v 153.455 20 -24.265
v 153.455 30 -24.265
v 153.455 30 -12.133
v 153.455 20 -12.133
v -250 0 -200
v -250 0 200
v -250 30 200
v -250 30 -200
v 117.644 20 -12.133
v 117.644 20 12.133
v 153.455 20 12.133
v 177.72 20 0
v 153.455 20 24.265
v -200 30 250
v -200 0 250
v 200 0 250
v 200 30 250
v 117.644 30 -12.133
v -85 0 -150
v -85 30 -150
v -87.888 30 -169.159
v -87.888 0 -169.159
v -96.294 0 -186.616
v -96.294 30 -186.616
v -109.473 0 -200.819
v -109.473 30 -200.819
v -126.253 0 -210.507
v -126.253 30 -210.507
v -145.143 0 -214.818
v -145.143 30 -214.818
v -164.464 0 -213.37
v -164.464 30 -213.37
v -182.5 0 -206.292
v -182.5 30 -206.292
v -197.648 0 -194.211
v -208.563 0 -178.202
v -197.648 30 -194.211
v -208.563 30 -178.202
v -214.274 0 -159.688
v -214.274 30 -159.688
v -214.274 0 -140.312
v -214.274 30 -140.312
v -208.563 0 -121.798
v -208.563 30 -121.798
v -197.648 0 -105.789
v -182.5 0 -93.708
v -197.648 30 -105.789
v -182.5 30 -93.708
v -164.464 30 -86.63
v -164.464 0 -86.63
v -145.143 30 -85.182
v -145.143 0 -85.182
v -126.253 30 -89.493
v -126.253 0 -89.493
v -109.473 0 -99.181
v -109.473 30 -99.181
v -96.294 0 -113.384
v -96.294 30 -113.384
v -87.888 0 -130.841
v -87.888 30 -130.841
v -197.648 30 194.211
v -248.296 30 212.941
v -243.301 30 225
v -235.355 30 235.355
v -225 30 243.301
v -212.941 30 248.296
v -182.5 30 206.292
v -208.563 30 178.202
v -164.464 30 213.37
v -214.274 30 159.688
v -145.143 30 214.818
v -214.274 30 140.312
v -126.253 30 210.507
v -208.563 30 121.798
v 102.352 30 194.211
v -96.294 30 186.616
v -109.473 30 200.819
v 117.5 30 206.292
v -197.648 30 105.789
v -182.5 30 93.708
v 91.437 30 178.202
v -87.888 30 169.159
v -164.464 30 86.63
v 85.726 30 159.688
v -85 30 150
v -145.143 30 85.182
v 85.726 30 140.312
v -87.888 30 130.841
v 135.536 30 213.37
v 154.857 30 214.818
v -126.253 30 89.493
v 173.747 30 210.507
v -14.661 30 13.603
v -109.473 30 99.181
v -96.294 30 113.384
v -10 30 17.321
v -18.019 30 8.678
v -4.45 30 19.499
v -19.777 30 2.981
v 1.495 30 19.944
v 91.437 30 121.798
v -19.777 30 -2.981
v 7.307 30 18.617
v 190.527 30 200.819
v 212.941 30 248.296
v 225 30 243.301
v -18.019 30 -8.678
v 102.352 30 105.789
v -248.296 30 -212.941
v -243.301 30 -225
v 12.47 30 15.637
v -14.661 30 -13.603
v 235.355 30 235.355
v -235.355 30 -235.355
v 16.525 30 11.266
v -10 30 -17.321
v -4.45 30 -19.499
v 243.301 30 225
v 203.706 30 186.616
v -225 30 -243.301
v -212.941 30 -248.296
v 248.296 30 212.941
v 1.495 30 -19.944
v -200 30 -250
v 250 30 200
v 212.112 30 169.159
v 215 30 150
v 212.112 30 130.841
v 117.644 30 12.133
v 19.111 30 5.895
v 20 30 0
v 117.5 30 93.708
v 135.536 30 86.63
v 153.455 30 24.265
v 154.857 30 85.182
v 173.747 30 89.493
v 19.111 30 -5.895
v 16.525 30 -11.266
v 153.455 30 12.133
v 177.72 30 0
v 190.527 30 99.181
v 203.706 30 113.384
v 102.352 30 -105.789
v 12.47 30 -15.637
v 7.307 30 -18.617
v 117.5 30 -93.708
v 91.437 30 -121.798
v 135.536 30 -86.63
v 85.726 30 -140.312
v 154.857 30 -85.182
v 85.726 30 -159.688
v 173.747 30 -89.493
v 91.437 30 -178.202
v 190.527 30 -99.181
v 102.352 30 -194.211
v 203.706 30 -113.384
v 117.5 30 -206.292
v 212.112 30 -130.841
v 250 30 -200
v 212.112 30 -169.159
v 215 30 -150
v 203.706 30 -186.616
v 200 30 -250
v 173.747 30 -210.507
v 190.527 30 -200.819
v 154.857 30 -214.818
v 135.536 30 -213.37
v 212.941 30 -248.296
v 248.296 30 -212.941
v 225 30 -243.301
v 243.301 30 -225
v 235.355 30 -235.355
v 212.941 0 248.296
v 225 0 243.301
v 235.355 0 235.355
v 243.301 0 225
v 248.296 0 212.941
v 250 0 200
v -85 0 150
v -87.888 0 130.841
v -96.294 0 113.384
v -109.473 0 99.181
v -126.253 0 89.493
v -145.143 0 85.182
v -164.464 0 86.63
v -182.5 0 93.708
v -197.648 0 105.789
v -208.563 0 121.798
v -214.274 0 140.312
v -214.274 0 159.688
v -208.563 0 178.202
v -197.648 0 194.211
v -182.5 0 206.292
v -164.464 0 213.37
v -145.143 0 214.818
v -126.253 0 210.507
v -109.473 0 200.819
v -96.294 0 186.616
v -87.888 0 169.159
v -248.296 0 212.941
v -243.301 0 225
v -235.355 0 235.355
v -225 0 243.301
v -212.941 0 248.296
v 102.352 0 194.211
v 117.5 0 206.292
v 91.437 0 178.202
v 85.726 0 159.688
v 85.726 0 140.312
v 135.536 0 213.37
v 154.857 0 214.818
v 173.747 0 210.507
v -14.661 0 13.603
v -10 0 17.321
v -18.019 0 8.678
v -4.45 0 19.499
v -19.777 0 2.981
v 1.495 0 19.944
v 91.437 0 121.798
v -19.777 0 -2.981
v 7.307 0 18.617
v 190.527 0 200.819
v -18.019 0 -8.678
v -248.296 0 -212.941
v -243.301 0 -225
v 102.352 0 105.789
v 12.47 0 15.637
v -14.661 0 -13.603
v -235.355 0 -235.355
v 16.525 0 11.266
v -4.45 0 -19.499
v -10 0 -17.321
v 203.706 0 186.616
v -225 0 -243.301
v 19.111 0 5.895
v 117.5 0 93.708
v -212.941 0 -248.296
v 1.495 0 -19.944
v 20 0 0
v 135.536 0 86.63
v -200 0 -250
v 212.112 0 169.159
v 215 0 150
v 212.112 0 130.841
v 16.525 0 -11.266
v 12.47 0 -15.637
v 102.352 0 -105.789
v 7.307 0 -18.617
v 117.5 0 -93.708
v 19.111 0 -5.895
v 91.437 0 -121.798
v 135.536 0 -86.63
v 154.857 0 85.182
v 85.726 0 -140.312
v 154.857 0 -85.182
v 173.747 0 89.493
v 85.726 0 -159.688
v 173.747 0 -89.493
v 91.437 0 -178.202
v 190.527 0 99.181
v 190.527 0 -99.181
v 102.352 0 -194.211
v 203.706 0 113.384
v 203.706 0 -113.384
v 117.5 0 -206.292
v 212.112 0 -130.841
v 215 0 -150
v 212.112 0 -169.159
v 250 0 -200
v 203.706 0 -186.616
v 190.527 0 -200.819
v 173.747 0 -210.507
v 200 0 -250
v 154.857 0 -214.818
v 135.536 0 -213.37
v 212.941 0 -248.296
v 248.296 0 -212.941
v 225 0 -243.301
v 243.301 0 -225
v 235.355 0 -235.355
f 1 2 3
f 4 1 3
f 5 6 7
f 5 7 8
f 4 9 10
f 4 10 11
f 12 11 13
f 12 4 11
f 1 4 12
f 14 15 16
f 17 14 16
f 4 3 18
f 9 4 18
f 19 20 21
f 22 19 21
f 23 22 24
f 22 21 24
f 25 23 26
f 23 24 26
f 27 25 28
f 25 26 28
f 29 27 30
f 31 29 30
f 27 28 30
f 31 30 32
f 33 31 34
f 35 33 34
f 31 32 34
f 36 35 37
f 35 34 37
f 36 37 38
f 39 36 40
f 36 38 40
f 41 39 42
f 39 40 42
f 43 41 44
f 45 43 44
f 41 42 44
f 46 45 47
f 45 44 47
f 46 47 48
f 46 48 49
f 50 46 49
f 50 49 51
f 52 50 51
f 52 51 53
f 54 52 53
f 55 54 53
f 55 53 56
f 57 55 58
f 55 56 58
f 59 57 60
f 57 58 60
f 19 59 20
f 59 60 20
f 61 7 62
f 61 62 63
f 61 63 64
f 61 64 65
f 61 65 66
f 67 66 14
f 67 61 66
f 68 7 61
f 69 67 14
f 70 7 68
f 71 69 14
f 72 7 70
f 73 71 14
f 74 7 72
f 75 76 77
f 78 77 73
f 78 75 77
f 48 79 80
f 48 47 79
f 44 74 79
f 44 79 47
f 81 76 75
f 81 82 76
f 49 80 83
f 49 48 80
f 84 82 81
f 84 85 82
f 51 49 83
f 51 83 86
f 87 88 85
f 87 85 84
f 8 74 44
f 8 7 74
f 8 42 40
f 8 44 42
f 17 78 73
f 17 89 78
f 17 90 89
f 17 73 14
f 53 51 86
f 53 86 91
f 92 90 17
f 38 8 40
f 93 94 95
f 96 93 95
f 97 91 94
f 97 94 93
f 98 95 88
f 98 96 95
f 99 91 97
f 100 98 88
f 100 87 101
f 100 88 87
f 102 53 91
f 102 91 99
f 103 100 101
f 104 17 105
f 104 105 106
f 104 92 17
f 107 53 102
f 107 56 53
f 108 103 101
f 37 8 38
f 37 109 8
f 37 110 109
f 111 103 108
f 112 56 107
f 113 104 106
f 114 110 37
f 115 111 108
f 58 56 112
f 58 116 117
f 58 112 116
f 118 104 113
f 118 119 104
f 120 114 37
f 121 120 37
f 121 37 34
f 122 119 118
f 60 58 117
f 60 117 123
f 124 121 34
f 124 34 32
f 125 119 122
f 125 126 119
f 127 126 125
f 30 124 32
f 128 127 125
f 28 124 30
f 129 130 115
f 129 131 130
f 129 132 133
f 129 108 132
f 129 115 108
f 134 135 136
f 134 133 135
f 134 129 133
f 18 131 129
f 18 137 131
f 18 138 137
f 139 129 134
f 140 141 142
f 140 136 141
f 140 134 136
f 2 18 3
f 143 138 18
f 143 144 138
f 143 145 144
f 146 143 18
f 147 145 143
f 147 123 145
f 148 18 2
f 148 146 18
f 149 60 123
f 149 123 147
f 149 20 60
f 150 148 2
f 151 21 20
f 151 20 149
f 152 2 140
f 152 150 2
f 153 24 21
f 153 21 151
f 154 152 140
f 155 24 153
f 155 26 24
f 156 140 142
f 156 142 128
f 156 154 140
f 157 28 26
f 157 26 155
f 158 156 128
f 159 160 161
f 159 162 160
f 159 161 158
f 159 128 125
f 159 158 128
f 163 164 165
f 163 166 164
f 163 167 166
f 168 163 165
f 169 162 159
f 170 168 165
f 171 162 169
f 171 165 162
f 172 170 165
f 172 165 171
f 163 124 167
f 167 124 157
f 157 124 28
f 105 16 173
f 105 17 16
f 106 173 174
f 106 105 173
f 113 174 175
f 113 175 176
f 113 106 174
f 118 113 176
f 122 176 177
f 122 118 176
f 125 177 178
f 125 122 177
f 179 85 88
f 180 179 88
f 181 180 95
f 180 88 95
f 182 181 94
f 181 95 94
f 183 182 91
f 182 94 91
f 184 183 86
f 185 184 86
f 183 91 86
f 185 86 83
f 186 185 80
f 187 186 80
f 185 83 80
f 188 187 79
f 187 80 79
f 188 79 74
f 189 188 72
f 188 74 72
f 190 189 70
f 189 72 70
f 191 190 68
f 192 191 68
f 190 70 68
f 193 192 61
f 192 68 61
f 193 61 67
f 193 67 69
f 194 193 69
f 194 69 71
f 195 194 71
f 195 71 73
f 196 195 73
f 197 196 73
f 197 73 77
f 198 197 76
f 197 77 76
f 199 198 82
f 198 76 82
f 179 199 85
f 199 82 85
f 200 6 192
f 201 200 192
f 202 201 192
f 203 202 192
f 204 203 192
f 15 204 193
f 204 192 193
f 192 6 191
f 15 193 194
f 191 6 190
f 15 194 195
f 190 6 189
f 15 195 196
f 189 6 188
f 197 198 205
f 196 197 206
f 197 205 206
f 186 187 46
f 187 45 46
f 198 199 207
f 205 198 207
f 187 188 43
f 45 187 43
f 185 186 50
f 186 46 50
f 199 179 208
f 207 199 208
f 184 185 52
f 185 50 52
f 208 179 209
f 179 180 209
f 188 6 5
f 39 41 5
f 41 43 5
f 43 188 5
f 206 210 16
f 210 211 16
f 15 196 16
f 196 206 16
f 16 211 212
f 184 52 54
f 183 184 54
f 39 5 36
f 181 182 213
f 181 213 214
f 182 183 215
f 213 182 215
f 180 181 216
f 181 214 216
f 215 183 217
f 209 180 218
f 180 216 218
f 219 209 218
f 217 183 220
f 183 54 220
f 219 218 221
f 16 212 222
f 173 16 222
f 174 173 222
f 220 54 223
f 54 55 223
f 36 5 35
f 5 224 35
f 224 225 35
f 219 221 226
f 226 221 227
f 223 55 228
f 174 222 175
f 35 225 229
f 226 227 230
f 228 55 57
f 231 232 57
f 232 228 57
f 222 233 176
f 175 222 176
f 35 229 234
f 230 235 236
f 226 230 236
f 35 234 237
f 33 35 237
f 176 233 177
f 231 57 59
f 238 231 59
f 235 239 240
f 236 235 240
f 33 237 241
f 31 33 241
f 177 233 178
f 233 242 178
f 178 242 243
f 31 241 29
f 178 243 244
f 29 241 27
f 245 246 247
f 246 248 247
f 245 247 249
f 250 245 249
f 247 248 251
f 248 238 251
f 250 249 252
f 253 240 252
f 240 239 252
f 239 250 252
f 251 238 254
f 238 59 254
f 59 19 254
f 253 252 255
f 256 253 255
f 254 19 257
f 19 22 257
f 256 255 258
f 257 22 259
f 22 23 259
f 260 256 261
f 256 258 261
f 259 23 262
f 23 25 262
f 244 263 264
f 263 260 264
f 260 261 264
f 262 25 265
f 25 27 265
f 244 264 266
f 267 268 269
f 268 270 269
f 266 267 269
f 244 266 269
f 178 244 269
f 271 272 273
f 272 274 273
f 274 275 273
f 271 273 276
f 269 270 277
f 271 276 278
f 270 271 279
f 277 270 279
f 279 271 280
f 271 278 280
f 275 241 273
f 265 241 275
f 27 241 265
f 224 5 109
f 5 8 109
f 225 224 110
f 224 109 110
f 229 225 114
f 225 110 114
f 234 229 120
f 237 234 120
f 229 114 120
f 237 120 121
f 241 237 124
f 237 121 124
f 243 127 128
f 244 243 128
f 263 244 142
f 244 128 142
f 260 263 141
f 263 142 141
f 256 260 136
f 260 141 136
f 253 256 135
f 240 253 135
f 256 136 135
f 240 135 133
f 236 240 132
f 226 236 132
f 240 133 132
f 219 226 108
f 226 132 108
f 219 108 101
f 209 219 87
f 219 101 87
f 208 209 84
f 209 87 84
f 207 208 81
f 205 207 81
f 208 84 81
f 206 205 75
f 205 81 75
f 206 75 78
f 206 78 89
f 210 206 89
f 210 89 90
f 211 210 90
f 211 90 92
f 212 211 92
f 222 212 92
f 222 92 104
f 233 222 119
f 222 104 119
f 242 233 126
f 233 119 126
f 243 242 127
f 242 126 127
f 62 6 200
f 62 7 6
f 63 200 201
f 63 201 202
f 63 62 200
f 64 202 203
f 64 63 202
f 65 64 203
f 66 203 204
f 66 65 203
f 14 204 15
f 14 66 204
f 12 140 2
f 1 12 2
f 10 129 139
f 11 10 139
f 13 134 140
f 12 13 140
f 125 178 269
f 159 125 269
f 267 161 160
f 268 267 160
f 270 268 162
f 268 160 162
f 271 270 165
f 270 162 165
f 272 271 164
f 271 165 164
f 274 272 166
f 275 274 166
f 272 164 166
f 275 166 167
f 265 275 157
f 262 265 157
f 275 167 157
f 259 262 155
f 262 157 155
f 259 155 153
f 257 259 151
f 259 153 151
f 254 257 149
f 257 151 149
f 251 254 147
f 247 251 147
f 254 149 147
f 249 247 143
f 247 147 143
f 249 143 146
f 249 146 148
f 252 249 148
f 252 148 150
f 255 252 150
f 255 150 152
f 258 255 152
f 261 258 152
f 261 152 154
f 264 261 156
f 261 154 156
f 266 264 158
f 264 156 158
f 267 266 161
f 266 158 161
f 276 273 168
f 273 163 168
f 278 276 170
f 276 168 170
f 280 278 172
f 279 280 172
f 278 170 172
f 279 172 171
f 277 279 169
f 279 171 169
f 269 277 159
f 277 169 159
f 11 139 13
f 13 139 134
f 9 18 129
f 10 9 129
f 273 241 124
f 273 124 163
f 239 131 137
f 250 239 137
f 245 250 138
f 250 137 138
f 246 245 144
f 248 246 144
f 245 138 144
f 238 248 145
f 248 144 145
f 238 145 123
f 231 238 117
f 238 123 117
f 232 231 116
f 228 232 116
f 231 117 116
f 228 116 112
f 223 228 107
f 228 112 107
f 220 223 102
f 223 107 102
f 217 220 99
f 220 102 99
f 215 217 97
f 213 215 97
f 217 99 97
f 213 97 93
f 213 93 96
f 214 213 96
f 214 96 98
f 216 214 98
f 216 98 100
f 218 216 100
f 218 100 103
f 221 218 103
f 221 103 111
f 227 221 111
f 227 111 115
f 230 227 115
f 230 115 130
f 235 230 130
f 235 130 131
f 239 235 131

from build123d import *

# Parameters (mm, degrees)
SKETCH_1_W          = 500
SKETCH_1_H          = 500
EXTRUDE_1_DEPTH     = 30
SKETCH_2_R          = 65
CUT_EXTRUDE_1_DEPTH = 30
FILLET_1_R          = 50
CUT_EXTRUDE_2_DEPTH = 10
SKETCH_4_R          = 20
CUT_EXTRUDE_3_DEPTH = 31


with BuildPart() as part:
    # 草图1 → 凸台-拉伸1 (new body)
    with BuildSketch(Plane(origin=(0, 0, 0), x_dir=(1, 0, 0), z_dir=(0, 1, 0))):
        Rectangle(SKETCH_1_W, SKETCH_1_H)
    extrude(amount=EXTRUDE_1_DEPTH)

    # 草图2 → 切除-拉伸1 (cut)
    with BuildSketch(Plane(origin=(0, 30, 0), x_dir=(1, 0, 0), z_dir=(0, 1, 0))):
        with Locations((150, -150)):
            Circle(SKETCH_2_R)
        with Locations((-150, -150)):
            Circle(SKETCH_2_R)
        with Locations((150, 150)):
            Circle(SKETCH_2_R)
        with Locations((-150, 150)):
            Circle(SKETCH_2_R)
    extrude(amount=-CUT_EXTRUDE_1_DEPTH, mode=Mode.SUBTRACT)

    # 圆角1
    fillet_1_edges = [part.edges().sort_by_distance(p)[0] for p in [
        (-250, 15, -250),
        (250, 15, -250),
        (250, 15, 250),
        (-250, 15, 250),
    ]]
    fillet(fillet_1_edges, radius=FILLET_1_R)

    # 草图3 → 切除-拉伸2 (cut)
    with BuildSketch(Plane(origin=(0, 30, 0), x_dir=(1, 0, 0), z_dir=(0, 1, 0))):
        Polygon((177.720371549, 0), (153.455288688, 24.265082861), (153.455288688, 12.13254143), (117.643810746, 12.13254143), (117.643810746, -12.13254143), (153.455288688, -12.13254143), (153.455288688, -24.265082861), align=None)
    extrude(amount=-CUT_EXTRUDE_2_DEPTH, mode=Mode.SUBTRACT)

    # 草图4 → 切除-拉伸3 (cut, through all)
    with BuildSketch(Plane(origin=(0, 30, 0), x_dir=(1, 0, 0), z_dir=(0, 1, 0))):
        Circle(SKETCH_4_R)
    extrude(amount=-CUT_EXTRUDE_3_DEPTH, mode=Mode.SUBTRACT)


solid = part.part
